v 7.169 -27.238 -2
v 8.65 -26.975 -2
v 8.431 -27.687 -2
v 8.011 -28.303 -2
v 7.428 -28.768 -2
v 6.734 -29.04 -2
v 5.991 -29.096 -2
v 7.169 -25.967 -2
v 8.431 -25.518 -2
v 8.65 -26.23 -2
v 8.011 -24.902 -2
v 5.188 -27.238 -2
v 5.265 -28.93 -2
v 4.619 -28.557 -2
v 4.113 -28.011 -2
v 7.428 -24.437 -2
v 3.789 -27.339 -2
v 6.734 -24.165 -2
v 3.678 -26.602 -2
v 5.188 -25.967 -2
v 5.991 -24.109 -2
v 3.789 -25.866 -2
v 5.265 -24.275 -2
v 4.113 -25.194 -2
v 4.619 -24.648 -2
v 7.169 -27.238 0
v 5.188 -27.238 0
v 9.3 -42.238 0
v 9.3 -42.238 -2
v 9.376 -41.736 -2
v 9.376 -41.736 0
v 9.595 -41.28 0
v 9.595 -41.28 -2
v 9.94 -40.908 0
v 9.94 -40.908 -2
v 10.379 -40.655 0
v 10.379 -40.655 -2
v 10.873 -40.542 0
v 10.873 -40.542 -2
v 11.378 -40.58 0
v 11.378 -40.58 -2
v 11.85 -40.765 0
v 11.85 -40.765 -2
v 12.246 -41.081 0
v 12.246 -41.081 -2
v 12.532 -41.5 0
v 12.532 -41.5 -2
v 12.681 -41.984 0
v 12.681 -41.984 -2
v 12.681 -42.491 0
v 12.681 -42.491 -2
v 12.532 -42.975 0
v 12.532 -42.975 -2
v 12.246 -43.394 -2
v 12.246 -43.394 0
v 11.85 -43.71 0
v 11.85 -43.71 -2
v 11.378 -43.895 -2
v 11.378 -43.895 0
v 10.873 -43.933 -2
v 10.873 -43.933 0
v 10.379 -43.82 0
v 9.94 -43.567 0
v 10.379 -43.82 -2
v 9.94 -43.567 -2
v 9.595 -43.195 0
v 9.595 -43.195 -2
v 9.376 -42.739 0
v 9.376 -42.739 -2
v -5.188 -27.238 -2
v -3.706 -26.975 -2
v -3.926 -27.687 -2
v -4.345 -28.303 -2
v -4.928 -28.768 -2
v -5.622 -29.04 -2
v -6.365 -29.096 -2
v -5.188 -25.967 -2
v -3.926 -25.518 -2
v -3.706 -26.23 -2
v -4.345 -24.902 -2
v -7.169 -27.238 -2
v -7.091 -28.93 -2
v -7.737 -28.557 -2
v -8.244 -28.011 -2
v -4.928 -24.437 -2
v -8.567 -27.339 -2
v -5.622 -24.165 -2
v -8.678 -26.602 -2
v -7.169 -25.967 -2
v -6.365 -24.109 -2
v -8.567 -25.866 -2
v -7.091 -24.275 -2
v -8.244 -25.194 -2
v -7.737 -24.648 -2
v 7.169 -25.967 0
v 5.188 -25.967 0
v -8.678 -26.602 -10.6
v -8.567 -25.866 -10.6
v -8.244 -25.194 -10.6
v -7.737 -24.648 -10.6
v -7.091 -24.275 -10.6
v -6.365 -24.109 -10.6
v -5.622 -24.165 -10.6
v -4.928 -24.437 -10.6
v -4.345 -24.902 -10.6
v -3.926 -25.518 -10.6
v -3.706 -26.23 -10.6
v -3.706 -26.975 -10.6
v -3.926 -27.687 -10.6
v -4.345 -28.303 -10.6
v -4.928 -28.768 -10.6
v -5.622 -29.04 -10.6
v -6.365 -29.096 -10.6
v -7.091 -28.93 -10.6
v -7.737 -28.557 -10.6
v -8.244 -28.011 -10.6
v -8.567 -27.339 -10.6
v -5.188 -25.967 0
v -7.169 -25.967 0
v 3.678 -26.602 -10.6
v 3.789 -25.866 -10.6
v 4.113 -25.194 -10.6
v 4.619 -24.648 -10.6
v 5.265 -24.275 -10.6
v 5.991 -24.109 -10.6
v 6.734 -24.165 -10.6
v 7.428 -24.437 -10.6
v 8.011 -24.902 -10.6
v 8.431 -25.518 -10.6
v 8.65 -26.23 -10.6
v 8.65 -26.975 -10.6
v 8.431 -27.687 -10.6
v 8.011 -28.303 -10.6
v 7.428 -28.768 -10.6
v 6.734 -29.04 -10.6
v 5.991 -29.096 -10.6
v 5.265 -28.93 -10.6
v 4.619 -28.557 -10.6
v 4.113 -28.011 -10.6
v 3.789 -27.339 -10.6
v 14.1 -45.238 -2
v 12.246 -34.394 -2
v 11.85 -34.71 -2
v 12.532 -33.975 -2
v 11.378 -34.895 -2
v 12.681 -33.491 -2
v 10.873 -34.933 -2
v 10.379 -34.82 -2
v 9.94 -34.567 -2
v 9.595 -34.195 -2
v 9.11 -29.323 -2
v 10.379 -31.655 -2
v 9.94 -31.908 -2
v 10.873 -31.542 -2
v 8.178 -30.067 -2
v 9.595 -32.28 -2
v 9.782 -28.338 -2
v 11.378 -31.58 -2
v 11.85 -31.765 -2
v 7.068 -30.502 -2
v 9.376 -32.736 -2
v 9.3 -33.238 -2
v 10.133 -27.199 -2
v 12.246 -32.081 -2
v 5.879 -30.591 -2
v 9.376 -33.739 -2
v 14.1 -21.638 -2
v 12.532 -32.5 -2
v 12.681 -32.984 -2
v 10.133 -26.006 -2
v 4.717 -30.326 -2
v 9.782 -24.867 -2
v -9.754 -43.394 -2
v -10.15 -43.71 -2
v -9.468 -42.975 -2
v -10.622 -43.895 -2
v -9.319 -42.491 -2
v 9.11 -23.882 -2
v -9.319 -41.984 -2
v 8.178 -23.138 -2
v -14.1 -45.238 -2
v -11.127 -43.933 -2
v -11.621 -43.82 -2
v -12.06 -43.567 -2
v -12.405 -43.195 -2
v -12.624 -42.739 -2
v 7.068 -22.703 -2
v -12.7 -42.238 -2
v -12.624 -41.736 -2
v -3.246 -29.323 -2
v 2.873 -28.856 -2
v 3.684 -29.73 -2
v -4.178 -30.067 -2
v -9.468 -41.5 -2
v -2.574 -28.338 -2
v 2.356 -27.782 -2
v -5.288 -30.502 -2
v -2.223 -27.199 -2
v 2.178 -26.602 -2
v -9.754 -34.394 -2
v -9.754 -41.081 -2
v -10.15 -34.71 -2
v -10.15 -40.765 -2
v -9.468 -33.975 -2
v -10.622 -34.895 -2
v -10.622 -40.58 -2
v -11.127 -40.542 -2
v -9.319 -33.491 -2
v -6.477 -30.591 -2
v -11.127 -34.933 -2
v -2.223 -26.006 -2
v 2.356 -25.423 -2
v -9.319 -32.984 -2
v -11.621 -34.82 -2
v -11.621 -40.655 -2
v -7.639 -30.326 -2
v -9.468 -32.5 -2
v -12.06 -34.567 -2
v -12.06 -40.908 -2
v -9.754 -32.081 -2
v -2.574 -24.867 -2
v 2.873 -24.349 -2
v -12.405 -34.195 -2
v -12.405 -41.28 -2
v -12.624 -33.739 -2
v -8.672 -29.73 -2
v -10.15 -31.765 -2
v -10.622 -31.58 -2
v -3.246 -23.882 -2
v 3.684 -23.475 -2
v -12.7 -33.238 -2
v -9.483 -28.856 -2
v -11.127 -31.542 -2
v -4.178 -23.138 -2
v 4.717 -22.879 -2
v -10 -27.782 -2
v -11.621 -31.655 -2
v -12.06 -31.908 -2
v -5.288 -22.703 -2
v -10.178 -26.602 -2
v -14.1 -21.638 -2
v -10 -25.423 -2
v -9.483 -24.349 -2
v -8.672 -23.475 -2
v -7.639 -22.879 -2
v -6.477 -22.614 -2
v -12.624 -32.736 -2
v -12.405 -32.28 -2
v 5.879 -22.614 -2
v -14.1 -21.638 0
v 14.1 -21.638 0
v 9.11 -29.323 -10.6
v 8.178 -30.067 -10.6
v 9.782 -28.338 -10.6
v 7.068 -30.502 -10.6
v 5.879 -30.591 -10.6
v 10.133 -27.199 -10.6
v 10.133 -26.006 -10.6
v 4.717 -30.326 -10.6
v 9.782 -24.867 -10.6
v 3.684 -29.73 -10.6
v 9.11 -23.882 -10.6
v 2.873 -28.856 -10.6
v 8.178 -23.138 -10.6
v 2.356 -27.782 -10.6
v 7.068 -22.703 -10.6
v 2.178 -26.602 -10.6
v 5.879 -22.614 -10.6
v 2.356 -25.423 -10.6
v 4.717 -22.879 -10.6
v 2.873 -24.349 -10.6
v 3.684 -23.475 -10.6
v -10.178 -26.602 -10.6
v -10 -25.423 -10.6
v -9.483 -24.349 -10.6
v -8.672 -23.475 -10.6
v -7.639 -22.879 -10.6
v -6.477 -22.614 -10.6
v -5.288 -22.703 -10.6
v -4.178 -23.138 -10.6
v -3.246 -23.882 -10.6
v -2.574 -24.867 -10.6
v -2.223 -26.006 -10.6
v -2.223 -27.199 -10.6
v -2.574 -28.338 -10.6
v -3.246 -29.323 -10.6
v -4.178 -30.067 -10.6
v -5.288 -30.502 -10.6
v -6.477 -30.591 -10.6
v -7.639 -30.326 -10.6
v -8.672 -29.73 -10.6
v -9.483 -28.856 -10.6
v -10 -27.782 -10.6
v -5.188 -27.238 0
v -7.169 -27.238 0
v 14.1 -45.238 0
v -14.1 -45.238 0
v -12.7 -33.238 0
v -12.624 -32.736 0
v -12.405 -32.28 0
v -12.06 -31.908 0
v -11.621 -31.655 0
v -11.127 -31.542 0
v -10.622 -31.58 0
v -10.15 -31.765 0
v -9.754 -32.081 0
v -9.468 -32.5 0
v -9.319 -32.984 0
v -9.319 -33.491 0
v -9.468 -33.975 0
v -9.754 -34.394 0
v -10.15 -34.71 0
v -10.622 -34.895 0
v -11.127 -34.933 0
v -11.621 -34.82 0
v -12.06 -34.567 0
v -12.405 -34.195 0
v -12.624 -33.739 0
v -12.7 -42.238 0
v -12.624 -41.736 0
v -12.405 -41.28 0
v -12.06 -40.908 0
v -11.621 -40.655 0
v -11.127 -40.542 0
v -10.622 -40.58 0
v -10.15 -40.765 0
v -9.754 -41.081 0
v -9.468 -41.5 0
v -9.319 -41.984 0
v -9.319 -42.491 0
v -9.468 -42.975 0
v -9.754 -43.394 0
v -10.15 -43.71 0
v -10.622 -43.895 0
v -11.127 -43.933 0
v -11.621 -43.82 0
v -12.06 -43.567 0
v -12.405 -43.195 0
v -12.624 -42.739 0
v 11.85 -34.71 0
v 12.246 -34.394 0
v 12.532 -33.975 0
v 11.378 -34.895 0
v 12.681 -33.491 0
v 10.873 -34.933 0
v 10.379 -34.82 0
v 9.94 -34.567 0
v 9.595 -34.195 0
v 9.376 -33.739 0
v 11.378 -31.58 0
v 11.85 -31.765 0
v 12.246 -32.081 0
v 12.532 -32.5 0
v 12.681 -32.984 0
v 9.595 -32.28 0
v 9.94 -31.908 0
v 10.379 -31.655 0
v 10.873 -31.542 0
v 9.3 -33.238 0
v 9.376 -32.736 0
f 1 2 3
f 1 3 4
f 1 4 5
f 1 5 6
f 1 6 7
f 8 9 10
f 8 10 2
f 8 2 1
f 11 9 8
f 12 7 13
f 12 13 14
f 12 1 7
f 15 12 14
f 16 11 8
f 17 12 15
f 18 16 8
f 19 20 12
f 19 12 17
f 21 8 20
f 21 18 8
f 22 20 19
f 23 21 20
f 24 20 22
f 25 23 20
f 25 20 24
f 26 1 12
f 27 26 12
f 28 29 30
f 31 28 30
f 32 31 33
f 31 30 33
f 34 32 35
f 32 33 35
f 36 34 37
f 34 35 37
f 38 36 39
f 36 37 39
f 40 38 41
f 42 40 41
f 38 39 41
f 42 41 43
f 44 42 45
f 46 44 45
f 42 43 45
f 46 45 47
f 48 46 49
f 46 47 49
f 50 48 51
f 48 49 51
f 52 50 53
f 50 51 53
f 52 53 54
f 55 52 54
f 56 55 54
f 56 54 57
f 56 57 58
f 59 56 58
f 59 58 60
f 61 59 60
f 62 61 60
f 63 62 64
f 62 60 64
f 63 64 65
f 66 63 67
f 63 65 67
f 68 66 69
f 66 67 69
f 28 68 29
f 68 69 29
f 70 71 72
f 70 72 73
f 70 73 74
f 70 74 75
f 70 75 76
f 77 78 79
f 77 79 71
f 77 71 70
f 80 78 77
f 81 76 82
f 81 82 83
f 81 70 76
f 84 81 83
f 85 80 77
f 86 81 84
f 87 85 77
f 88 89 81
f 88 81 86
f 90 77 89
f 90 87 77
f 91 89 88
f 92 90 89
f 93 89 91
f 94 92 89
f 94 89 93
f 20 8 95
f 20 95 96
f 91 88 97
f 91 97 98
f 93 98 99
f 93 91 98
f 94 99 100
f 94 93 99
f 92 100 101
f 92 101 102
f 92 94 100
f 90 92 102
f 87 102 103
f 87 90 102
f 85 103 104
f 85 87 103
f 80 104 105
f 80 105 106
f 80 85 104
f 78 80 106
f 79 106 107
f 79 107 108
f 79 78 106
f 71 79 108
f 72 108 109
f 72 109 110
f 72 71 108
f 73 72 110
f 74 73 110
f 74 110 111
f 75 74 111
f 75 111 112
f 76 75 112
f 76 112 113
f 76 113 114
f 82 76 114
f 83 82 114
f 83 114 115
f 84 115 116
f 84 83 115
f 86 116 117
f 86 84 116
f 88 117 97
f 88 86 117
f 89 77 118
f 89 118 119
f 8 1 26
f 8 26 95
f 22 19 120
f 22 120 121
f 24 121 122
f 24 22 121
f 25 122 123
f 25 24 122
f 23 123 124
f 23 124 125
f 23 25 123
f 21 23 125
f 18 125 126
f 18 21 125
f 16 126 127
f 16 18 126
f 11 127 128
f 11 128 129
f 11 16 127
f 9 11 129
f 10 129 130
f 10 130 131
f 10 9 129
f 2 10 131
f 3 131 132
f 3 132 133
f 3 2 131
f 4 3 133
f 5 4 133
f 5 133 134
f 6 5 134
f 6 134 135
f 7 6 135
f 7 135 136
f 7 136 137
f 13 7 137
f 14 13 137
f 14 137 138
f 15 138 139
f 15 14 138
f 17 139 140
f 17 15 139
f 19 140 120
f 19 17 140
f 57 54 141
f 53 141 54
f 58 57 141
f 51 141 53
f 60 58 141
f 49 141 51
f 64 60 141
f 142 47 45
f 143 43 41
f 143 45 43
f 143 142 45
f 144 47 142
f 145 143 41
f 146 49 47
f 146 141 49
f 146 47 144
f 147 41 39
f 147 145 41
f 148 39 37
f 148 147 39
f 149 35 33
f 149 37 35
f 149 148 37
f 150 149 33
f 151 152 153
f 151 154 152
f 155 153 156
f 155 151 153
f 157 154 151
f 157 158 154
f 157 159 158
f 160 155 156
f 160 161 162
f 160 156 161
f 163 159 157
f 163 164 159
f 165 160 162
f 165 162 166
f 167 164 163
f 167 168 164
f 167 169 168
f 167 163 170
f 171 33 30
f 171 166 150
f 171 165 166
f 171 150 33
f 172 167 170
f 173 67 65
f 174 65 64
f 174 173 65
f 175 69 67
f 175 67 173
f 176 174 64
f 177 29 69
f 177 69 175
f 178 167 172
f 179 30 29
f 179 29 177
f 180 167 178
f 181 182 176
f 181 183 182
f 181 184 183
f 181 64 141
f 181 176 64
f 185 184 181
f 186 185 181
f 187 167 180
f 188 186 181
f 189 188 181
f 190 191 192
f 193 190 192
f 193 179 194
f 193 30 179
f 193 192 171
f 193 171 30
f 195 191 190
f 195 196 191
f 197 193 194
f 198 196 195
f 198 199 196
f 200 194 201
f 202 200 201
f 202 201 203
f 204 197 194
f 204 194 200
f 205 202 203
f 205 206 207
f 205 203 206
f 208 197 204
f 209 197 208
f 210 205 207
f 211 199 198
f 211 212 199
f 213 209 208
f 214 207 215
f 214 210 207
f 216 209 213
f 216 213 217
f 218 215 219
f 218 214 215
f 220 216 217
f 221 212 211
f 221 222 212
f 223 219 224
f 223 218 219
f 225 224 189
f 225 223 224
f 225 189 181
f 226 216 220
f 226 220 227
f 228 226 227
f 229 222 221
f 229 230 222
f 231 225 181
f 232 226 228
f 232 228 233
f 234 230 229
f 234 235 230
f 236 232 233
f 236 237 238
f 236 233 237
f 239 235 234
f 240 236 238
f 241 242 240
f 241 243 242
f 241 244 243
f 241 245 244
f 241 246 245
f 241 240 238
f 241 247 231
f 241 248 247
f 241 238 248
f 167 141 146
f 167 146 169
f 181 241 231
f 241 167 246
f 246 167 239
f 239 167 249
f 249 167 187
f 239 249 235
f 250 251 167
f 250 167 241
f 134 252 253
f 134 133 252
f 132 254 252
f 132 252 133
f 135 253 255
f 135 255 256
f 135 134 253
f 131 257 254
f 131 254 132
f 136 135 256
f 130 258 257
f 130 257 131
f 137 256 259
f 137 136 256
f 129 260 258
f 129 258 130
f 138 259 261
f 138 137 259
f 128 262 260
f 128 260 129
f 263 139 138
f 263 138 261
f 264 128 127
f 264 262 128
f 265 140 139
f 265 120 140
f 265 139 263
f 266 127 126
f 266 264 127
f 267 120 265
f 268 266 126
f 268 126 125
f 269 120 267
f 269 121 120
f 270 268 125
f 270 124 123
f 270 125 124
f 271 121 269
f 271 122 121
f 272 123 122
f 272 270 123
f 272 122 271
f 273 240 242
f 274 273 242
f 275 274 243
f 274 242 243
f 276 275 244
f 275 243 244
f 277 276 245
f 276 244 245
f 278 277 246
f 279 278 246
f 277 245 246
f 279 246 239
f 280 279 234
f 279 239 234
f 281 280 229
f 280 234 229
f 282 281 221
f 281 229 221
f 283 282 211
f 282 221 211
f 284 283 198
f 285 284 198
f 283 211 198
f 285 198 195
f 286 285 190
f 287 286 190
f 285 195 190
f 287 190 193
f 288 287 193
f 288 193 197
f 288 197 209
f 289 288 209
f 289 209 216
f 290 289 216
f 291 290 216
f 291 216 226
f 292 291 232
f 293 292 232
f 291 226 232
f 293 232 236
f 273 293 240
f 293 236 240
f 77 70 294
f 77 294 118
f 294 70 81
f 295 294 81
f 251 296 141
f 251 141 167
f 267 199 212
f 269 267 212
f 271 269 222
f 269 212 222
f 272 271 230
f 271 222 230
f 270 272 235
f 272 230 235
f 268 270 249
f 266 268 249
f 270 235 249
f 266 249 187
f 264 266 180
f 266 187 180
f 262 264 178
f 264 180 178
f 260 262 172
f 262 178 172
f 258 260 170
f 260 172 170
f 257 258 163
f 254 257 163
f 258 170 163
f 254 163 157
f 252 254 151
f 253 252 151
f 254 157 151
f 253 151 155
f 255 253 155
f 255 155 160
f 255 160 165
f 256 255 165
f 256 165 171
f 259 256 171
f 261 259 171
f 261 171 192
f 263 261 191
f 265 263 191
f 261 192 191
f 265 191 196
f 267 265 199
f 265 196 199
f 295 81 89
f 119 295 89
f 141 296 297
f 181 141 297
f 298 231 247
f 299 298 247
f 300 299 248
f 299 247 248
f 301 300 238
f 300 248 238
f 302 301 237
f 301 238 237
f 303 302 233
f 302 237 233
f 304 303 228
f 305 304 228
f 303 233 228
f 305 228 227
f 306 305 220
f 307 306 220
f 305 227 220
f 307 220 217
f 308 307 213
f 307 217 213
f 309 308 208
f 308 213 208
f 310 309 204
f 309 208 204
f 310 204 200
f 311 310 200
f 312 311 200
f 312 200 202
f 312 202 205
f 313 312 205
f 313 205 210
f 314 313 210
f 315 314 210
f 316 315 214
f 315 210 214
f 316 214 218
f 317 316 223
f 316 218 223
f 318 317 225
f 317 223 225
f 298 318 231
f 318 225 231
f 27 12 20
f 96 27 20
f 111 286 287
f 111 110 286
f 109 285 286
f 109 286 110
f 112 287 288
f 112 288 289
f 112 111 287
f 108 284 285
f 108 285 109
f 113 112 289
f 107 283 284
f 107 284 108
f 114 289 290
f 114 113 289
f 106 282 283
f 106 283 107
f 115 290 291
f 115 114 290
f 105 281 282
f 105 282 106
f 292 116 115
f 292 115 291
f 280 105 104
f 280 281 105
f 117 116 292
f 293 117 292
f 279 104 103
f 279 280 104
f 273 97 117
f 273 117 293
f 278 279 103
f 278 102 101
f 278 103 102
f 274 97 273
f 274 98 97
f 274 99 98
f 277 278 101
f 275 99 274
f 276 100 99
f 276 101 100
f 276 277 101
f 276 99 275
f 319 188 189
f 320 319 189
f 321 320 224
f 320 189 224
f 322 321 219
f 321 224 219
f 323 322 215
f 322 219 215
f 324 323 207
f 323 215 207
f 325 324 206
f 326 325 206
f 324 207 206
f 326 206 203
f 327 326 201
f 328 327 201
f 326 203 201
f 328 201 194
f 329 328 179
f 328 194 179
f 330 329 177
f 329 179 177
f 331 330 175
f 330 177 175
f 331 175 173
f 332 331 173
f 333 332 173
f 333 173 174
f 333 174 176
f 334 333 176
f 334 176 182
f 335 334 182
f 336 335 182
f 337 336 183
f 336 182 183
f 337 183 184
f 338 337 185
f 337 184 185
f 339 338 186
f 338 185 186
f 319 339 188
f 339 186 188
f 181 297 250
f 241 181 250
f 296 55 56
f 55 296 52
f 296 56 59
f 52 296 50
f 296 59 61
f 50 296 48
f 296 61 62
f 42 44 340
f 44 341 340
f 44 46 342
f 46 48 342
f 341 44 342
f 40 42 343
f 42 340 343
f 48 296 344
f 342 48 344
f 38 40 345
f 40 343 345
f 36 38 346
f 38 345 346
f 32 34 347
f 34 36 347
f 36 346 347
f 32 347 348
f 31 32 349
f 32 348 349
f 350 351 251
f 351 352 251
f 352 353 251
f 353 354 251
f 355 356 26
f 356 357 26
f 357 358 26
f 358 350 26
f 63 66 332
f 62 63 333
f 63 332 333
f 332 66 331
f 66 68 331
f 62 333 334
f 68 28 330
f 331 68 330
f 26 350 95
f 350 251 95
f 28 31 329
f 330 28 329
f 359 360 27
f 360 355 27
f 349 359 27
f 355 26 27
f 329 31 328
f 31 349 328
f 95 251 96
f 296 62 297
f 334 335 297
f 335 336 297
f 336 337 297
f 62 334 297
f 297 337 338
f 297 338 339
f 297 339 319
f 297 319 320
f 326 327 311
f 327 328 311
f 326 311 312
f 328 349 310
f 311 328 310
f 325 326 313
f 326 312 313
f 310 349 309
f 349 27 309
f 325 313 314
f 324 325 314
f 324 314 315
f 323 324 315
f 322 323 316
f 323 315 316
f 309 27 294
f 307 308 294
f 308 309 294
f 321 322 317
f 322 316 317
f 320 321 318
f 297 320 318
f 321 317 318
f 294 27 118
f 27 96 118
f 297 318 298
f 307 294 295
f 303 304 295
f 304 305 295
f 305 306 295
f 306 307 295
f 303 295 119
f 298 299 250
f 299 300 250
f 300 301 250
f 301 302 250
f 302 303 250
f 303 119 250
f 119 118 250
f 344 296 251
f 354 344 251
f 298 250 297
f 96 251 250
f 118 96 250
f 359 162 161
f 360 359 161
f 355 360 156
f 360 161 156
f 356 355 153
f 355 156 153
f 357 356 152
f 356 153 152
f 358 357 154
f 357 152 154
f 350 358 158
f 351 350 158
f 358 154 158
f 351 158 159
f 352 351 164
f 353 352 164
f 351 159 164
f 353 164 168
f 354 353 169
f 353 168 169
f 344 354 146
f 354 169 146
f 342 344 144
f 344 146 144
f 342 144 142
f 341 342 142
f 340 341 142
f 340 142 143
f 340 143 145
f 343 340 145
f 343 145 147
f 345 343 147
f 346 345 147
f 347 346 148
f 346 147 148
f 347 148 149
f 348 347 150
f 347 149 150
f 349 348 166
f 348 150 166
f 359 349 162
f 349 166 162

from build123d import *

# Parameters (mm, degrees)
SKETCH013_W             = 28.2
SKETCH013_H             = 23.6
PAD004_DEPTH            = 2
SKETCH014_W             = 1.9812
SKETCH014_H             = 1.27
POCKET005_DEPTH         = 2
SKETCH015_R             = 4
SKETCH015_R_2           = 2.5
PAD005_DEPTH            = 8.6
SKETCH016_R             = 1.7
POCKET006_DEPTH         = 2
BODY002_PLACEMENT_ANGLE = 180


with BuildPart() as part:
    # Sketch013 → Pad004 (new body)
    with BuildSketch(Plane.XY):
        with Locations((0, -33.4375)):
            Rectangle(SKETCH013_W, SKETCH013_H)
    extrude(amount=PAD004_DEPTH)

    # Sketch014 (on Face6 of Pad004) → Pocket005 (cut)
    with BuildSketch(Plane.XY.offset(2)):
        with Locations((-6.1781, -26.6025)):
            Rectangle(SKETCH014_W, SKETCH014_H)
        with Locations((6.1781, -26.6025)):
            Rectangle(SKETCH014_W, SKETCH014_H)
    extrude(amount=-POCKET005_DEPTH, mode=Mode.SUBTRACT)

    # Sketch015 (on Face5 of Pocket005) → Pad005 (join)
    with BuildSketch(Plane.XY.offset(2)):
        with Locations((-6.1781, -26.6025)):
            Circle(SKETCH015_R)
        with Locations((-6.1781, -26.6025)):
            Circle(SKETCH015_R_2, mode=Mode.SUBTRACT)
        with Locations((6.1781, -26.6025)):
            Circle(SKETCH015_R)
        with Locations((6.1781, -26.6025)):
            Circle(SKETCH015_R_2, mode=Mode.SUBTRACT)
    extrude(amount=PAD005_DEPTH)

    # Sketch016 (on Face5 of Pad005) → Pocket006 (cut)
    with BuildSketch(Plane.XY.offset(2)):
        with Locations((-11, -42.2375)):
            Circle(SKETCH016_R)
        with Locations((11, -42.2375)):
            Circle(SKETCH016_R)
        with Locations((-11, -33.2375)):
            Circle(SKETCH016_R)
        with Locations((11, -33.2375)):
            Circle(SKETCH016_R)
    extrude(amount=-POCKET006_DEPTH, mode=Mode.SUBTRACT)


with BuildPart() as part_1:
    # Body002 placement: moved
    add(part.part.rotate(Axis((0, 0, 0), (0, 1, 0)), BODY002_PLACEMENT_ANGLE))


solid = part_1.part
